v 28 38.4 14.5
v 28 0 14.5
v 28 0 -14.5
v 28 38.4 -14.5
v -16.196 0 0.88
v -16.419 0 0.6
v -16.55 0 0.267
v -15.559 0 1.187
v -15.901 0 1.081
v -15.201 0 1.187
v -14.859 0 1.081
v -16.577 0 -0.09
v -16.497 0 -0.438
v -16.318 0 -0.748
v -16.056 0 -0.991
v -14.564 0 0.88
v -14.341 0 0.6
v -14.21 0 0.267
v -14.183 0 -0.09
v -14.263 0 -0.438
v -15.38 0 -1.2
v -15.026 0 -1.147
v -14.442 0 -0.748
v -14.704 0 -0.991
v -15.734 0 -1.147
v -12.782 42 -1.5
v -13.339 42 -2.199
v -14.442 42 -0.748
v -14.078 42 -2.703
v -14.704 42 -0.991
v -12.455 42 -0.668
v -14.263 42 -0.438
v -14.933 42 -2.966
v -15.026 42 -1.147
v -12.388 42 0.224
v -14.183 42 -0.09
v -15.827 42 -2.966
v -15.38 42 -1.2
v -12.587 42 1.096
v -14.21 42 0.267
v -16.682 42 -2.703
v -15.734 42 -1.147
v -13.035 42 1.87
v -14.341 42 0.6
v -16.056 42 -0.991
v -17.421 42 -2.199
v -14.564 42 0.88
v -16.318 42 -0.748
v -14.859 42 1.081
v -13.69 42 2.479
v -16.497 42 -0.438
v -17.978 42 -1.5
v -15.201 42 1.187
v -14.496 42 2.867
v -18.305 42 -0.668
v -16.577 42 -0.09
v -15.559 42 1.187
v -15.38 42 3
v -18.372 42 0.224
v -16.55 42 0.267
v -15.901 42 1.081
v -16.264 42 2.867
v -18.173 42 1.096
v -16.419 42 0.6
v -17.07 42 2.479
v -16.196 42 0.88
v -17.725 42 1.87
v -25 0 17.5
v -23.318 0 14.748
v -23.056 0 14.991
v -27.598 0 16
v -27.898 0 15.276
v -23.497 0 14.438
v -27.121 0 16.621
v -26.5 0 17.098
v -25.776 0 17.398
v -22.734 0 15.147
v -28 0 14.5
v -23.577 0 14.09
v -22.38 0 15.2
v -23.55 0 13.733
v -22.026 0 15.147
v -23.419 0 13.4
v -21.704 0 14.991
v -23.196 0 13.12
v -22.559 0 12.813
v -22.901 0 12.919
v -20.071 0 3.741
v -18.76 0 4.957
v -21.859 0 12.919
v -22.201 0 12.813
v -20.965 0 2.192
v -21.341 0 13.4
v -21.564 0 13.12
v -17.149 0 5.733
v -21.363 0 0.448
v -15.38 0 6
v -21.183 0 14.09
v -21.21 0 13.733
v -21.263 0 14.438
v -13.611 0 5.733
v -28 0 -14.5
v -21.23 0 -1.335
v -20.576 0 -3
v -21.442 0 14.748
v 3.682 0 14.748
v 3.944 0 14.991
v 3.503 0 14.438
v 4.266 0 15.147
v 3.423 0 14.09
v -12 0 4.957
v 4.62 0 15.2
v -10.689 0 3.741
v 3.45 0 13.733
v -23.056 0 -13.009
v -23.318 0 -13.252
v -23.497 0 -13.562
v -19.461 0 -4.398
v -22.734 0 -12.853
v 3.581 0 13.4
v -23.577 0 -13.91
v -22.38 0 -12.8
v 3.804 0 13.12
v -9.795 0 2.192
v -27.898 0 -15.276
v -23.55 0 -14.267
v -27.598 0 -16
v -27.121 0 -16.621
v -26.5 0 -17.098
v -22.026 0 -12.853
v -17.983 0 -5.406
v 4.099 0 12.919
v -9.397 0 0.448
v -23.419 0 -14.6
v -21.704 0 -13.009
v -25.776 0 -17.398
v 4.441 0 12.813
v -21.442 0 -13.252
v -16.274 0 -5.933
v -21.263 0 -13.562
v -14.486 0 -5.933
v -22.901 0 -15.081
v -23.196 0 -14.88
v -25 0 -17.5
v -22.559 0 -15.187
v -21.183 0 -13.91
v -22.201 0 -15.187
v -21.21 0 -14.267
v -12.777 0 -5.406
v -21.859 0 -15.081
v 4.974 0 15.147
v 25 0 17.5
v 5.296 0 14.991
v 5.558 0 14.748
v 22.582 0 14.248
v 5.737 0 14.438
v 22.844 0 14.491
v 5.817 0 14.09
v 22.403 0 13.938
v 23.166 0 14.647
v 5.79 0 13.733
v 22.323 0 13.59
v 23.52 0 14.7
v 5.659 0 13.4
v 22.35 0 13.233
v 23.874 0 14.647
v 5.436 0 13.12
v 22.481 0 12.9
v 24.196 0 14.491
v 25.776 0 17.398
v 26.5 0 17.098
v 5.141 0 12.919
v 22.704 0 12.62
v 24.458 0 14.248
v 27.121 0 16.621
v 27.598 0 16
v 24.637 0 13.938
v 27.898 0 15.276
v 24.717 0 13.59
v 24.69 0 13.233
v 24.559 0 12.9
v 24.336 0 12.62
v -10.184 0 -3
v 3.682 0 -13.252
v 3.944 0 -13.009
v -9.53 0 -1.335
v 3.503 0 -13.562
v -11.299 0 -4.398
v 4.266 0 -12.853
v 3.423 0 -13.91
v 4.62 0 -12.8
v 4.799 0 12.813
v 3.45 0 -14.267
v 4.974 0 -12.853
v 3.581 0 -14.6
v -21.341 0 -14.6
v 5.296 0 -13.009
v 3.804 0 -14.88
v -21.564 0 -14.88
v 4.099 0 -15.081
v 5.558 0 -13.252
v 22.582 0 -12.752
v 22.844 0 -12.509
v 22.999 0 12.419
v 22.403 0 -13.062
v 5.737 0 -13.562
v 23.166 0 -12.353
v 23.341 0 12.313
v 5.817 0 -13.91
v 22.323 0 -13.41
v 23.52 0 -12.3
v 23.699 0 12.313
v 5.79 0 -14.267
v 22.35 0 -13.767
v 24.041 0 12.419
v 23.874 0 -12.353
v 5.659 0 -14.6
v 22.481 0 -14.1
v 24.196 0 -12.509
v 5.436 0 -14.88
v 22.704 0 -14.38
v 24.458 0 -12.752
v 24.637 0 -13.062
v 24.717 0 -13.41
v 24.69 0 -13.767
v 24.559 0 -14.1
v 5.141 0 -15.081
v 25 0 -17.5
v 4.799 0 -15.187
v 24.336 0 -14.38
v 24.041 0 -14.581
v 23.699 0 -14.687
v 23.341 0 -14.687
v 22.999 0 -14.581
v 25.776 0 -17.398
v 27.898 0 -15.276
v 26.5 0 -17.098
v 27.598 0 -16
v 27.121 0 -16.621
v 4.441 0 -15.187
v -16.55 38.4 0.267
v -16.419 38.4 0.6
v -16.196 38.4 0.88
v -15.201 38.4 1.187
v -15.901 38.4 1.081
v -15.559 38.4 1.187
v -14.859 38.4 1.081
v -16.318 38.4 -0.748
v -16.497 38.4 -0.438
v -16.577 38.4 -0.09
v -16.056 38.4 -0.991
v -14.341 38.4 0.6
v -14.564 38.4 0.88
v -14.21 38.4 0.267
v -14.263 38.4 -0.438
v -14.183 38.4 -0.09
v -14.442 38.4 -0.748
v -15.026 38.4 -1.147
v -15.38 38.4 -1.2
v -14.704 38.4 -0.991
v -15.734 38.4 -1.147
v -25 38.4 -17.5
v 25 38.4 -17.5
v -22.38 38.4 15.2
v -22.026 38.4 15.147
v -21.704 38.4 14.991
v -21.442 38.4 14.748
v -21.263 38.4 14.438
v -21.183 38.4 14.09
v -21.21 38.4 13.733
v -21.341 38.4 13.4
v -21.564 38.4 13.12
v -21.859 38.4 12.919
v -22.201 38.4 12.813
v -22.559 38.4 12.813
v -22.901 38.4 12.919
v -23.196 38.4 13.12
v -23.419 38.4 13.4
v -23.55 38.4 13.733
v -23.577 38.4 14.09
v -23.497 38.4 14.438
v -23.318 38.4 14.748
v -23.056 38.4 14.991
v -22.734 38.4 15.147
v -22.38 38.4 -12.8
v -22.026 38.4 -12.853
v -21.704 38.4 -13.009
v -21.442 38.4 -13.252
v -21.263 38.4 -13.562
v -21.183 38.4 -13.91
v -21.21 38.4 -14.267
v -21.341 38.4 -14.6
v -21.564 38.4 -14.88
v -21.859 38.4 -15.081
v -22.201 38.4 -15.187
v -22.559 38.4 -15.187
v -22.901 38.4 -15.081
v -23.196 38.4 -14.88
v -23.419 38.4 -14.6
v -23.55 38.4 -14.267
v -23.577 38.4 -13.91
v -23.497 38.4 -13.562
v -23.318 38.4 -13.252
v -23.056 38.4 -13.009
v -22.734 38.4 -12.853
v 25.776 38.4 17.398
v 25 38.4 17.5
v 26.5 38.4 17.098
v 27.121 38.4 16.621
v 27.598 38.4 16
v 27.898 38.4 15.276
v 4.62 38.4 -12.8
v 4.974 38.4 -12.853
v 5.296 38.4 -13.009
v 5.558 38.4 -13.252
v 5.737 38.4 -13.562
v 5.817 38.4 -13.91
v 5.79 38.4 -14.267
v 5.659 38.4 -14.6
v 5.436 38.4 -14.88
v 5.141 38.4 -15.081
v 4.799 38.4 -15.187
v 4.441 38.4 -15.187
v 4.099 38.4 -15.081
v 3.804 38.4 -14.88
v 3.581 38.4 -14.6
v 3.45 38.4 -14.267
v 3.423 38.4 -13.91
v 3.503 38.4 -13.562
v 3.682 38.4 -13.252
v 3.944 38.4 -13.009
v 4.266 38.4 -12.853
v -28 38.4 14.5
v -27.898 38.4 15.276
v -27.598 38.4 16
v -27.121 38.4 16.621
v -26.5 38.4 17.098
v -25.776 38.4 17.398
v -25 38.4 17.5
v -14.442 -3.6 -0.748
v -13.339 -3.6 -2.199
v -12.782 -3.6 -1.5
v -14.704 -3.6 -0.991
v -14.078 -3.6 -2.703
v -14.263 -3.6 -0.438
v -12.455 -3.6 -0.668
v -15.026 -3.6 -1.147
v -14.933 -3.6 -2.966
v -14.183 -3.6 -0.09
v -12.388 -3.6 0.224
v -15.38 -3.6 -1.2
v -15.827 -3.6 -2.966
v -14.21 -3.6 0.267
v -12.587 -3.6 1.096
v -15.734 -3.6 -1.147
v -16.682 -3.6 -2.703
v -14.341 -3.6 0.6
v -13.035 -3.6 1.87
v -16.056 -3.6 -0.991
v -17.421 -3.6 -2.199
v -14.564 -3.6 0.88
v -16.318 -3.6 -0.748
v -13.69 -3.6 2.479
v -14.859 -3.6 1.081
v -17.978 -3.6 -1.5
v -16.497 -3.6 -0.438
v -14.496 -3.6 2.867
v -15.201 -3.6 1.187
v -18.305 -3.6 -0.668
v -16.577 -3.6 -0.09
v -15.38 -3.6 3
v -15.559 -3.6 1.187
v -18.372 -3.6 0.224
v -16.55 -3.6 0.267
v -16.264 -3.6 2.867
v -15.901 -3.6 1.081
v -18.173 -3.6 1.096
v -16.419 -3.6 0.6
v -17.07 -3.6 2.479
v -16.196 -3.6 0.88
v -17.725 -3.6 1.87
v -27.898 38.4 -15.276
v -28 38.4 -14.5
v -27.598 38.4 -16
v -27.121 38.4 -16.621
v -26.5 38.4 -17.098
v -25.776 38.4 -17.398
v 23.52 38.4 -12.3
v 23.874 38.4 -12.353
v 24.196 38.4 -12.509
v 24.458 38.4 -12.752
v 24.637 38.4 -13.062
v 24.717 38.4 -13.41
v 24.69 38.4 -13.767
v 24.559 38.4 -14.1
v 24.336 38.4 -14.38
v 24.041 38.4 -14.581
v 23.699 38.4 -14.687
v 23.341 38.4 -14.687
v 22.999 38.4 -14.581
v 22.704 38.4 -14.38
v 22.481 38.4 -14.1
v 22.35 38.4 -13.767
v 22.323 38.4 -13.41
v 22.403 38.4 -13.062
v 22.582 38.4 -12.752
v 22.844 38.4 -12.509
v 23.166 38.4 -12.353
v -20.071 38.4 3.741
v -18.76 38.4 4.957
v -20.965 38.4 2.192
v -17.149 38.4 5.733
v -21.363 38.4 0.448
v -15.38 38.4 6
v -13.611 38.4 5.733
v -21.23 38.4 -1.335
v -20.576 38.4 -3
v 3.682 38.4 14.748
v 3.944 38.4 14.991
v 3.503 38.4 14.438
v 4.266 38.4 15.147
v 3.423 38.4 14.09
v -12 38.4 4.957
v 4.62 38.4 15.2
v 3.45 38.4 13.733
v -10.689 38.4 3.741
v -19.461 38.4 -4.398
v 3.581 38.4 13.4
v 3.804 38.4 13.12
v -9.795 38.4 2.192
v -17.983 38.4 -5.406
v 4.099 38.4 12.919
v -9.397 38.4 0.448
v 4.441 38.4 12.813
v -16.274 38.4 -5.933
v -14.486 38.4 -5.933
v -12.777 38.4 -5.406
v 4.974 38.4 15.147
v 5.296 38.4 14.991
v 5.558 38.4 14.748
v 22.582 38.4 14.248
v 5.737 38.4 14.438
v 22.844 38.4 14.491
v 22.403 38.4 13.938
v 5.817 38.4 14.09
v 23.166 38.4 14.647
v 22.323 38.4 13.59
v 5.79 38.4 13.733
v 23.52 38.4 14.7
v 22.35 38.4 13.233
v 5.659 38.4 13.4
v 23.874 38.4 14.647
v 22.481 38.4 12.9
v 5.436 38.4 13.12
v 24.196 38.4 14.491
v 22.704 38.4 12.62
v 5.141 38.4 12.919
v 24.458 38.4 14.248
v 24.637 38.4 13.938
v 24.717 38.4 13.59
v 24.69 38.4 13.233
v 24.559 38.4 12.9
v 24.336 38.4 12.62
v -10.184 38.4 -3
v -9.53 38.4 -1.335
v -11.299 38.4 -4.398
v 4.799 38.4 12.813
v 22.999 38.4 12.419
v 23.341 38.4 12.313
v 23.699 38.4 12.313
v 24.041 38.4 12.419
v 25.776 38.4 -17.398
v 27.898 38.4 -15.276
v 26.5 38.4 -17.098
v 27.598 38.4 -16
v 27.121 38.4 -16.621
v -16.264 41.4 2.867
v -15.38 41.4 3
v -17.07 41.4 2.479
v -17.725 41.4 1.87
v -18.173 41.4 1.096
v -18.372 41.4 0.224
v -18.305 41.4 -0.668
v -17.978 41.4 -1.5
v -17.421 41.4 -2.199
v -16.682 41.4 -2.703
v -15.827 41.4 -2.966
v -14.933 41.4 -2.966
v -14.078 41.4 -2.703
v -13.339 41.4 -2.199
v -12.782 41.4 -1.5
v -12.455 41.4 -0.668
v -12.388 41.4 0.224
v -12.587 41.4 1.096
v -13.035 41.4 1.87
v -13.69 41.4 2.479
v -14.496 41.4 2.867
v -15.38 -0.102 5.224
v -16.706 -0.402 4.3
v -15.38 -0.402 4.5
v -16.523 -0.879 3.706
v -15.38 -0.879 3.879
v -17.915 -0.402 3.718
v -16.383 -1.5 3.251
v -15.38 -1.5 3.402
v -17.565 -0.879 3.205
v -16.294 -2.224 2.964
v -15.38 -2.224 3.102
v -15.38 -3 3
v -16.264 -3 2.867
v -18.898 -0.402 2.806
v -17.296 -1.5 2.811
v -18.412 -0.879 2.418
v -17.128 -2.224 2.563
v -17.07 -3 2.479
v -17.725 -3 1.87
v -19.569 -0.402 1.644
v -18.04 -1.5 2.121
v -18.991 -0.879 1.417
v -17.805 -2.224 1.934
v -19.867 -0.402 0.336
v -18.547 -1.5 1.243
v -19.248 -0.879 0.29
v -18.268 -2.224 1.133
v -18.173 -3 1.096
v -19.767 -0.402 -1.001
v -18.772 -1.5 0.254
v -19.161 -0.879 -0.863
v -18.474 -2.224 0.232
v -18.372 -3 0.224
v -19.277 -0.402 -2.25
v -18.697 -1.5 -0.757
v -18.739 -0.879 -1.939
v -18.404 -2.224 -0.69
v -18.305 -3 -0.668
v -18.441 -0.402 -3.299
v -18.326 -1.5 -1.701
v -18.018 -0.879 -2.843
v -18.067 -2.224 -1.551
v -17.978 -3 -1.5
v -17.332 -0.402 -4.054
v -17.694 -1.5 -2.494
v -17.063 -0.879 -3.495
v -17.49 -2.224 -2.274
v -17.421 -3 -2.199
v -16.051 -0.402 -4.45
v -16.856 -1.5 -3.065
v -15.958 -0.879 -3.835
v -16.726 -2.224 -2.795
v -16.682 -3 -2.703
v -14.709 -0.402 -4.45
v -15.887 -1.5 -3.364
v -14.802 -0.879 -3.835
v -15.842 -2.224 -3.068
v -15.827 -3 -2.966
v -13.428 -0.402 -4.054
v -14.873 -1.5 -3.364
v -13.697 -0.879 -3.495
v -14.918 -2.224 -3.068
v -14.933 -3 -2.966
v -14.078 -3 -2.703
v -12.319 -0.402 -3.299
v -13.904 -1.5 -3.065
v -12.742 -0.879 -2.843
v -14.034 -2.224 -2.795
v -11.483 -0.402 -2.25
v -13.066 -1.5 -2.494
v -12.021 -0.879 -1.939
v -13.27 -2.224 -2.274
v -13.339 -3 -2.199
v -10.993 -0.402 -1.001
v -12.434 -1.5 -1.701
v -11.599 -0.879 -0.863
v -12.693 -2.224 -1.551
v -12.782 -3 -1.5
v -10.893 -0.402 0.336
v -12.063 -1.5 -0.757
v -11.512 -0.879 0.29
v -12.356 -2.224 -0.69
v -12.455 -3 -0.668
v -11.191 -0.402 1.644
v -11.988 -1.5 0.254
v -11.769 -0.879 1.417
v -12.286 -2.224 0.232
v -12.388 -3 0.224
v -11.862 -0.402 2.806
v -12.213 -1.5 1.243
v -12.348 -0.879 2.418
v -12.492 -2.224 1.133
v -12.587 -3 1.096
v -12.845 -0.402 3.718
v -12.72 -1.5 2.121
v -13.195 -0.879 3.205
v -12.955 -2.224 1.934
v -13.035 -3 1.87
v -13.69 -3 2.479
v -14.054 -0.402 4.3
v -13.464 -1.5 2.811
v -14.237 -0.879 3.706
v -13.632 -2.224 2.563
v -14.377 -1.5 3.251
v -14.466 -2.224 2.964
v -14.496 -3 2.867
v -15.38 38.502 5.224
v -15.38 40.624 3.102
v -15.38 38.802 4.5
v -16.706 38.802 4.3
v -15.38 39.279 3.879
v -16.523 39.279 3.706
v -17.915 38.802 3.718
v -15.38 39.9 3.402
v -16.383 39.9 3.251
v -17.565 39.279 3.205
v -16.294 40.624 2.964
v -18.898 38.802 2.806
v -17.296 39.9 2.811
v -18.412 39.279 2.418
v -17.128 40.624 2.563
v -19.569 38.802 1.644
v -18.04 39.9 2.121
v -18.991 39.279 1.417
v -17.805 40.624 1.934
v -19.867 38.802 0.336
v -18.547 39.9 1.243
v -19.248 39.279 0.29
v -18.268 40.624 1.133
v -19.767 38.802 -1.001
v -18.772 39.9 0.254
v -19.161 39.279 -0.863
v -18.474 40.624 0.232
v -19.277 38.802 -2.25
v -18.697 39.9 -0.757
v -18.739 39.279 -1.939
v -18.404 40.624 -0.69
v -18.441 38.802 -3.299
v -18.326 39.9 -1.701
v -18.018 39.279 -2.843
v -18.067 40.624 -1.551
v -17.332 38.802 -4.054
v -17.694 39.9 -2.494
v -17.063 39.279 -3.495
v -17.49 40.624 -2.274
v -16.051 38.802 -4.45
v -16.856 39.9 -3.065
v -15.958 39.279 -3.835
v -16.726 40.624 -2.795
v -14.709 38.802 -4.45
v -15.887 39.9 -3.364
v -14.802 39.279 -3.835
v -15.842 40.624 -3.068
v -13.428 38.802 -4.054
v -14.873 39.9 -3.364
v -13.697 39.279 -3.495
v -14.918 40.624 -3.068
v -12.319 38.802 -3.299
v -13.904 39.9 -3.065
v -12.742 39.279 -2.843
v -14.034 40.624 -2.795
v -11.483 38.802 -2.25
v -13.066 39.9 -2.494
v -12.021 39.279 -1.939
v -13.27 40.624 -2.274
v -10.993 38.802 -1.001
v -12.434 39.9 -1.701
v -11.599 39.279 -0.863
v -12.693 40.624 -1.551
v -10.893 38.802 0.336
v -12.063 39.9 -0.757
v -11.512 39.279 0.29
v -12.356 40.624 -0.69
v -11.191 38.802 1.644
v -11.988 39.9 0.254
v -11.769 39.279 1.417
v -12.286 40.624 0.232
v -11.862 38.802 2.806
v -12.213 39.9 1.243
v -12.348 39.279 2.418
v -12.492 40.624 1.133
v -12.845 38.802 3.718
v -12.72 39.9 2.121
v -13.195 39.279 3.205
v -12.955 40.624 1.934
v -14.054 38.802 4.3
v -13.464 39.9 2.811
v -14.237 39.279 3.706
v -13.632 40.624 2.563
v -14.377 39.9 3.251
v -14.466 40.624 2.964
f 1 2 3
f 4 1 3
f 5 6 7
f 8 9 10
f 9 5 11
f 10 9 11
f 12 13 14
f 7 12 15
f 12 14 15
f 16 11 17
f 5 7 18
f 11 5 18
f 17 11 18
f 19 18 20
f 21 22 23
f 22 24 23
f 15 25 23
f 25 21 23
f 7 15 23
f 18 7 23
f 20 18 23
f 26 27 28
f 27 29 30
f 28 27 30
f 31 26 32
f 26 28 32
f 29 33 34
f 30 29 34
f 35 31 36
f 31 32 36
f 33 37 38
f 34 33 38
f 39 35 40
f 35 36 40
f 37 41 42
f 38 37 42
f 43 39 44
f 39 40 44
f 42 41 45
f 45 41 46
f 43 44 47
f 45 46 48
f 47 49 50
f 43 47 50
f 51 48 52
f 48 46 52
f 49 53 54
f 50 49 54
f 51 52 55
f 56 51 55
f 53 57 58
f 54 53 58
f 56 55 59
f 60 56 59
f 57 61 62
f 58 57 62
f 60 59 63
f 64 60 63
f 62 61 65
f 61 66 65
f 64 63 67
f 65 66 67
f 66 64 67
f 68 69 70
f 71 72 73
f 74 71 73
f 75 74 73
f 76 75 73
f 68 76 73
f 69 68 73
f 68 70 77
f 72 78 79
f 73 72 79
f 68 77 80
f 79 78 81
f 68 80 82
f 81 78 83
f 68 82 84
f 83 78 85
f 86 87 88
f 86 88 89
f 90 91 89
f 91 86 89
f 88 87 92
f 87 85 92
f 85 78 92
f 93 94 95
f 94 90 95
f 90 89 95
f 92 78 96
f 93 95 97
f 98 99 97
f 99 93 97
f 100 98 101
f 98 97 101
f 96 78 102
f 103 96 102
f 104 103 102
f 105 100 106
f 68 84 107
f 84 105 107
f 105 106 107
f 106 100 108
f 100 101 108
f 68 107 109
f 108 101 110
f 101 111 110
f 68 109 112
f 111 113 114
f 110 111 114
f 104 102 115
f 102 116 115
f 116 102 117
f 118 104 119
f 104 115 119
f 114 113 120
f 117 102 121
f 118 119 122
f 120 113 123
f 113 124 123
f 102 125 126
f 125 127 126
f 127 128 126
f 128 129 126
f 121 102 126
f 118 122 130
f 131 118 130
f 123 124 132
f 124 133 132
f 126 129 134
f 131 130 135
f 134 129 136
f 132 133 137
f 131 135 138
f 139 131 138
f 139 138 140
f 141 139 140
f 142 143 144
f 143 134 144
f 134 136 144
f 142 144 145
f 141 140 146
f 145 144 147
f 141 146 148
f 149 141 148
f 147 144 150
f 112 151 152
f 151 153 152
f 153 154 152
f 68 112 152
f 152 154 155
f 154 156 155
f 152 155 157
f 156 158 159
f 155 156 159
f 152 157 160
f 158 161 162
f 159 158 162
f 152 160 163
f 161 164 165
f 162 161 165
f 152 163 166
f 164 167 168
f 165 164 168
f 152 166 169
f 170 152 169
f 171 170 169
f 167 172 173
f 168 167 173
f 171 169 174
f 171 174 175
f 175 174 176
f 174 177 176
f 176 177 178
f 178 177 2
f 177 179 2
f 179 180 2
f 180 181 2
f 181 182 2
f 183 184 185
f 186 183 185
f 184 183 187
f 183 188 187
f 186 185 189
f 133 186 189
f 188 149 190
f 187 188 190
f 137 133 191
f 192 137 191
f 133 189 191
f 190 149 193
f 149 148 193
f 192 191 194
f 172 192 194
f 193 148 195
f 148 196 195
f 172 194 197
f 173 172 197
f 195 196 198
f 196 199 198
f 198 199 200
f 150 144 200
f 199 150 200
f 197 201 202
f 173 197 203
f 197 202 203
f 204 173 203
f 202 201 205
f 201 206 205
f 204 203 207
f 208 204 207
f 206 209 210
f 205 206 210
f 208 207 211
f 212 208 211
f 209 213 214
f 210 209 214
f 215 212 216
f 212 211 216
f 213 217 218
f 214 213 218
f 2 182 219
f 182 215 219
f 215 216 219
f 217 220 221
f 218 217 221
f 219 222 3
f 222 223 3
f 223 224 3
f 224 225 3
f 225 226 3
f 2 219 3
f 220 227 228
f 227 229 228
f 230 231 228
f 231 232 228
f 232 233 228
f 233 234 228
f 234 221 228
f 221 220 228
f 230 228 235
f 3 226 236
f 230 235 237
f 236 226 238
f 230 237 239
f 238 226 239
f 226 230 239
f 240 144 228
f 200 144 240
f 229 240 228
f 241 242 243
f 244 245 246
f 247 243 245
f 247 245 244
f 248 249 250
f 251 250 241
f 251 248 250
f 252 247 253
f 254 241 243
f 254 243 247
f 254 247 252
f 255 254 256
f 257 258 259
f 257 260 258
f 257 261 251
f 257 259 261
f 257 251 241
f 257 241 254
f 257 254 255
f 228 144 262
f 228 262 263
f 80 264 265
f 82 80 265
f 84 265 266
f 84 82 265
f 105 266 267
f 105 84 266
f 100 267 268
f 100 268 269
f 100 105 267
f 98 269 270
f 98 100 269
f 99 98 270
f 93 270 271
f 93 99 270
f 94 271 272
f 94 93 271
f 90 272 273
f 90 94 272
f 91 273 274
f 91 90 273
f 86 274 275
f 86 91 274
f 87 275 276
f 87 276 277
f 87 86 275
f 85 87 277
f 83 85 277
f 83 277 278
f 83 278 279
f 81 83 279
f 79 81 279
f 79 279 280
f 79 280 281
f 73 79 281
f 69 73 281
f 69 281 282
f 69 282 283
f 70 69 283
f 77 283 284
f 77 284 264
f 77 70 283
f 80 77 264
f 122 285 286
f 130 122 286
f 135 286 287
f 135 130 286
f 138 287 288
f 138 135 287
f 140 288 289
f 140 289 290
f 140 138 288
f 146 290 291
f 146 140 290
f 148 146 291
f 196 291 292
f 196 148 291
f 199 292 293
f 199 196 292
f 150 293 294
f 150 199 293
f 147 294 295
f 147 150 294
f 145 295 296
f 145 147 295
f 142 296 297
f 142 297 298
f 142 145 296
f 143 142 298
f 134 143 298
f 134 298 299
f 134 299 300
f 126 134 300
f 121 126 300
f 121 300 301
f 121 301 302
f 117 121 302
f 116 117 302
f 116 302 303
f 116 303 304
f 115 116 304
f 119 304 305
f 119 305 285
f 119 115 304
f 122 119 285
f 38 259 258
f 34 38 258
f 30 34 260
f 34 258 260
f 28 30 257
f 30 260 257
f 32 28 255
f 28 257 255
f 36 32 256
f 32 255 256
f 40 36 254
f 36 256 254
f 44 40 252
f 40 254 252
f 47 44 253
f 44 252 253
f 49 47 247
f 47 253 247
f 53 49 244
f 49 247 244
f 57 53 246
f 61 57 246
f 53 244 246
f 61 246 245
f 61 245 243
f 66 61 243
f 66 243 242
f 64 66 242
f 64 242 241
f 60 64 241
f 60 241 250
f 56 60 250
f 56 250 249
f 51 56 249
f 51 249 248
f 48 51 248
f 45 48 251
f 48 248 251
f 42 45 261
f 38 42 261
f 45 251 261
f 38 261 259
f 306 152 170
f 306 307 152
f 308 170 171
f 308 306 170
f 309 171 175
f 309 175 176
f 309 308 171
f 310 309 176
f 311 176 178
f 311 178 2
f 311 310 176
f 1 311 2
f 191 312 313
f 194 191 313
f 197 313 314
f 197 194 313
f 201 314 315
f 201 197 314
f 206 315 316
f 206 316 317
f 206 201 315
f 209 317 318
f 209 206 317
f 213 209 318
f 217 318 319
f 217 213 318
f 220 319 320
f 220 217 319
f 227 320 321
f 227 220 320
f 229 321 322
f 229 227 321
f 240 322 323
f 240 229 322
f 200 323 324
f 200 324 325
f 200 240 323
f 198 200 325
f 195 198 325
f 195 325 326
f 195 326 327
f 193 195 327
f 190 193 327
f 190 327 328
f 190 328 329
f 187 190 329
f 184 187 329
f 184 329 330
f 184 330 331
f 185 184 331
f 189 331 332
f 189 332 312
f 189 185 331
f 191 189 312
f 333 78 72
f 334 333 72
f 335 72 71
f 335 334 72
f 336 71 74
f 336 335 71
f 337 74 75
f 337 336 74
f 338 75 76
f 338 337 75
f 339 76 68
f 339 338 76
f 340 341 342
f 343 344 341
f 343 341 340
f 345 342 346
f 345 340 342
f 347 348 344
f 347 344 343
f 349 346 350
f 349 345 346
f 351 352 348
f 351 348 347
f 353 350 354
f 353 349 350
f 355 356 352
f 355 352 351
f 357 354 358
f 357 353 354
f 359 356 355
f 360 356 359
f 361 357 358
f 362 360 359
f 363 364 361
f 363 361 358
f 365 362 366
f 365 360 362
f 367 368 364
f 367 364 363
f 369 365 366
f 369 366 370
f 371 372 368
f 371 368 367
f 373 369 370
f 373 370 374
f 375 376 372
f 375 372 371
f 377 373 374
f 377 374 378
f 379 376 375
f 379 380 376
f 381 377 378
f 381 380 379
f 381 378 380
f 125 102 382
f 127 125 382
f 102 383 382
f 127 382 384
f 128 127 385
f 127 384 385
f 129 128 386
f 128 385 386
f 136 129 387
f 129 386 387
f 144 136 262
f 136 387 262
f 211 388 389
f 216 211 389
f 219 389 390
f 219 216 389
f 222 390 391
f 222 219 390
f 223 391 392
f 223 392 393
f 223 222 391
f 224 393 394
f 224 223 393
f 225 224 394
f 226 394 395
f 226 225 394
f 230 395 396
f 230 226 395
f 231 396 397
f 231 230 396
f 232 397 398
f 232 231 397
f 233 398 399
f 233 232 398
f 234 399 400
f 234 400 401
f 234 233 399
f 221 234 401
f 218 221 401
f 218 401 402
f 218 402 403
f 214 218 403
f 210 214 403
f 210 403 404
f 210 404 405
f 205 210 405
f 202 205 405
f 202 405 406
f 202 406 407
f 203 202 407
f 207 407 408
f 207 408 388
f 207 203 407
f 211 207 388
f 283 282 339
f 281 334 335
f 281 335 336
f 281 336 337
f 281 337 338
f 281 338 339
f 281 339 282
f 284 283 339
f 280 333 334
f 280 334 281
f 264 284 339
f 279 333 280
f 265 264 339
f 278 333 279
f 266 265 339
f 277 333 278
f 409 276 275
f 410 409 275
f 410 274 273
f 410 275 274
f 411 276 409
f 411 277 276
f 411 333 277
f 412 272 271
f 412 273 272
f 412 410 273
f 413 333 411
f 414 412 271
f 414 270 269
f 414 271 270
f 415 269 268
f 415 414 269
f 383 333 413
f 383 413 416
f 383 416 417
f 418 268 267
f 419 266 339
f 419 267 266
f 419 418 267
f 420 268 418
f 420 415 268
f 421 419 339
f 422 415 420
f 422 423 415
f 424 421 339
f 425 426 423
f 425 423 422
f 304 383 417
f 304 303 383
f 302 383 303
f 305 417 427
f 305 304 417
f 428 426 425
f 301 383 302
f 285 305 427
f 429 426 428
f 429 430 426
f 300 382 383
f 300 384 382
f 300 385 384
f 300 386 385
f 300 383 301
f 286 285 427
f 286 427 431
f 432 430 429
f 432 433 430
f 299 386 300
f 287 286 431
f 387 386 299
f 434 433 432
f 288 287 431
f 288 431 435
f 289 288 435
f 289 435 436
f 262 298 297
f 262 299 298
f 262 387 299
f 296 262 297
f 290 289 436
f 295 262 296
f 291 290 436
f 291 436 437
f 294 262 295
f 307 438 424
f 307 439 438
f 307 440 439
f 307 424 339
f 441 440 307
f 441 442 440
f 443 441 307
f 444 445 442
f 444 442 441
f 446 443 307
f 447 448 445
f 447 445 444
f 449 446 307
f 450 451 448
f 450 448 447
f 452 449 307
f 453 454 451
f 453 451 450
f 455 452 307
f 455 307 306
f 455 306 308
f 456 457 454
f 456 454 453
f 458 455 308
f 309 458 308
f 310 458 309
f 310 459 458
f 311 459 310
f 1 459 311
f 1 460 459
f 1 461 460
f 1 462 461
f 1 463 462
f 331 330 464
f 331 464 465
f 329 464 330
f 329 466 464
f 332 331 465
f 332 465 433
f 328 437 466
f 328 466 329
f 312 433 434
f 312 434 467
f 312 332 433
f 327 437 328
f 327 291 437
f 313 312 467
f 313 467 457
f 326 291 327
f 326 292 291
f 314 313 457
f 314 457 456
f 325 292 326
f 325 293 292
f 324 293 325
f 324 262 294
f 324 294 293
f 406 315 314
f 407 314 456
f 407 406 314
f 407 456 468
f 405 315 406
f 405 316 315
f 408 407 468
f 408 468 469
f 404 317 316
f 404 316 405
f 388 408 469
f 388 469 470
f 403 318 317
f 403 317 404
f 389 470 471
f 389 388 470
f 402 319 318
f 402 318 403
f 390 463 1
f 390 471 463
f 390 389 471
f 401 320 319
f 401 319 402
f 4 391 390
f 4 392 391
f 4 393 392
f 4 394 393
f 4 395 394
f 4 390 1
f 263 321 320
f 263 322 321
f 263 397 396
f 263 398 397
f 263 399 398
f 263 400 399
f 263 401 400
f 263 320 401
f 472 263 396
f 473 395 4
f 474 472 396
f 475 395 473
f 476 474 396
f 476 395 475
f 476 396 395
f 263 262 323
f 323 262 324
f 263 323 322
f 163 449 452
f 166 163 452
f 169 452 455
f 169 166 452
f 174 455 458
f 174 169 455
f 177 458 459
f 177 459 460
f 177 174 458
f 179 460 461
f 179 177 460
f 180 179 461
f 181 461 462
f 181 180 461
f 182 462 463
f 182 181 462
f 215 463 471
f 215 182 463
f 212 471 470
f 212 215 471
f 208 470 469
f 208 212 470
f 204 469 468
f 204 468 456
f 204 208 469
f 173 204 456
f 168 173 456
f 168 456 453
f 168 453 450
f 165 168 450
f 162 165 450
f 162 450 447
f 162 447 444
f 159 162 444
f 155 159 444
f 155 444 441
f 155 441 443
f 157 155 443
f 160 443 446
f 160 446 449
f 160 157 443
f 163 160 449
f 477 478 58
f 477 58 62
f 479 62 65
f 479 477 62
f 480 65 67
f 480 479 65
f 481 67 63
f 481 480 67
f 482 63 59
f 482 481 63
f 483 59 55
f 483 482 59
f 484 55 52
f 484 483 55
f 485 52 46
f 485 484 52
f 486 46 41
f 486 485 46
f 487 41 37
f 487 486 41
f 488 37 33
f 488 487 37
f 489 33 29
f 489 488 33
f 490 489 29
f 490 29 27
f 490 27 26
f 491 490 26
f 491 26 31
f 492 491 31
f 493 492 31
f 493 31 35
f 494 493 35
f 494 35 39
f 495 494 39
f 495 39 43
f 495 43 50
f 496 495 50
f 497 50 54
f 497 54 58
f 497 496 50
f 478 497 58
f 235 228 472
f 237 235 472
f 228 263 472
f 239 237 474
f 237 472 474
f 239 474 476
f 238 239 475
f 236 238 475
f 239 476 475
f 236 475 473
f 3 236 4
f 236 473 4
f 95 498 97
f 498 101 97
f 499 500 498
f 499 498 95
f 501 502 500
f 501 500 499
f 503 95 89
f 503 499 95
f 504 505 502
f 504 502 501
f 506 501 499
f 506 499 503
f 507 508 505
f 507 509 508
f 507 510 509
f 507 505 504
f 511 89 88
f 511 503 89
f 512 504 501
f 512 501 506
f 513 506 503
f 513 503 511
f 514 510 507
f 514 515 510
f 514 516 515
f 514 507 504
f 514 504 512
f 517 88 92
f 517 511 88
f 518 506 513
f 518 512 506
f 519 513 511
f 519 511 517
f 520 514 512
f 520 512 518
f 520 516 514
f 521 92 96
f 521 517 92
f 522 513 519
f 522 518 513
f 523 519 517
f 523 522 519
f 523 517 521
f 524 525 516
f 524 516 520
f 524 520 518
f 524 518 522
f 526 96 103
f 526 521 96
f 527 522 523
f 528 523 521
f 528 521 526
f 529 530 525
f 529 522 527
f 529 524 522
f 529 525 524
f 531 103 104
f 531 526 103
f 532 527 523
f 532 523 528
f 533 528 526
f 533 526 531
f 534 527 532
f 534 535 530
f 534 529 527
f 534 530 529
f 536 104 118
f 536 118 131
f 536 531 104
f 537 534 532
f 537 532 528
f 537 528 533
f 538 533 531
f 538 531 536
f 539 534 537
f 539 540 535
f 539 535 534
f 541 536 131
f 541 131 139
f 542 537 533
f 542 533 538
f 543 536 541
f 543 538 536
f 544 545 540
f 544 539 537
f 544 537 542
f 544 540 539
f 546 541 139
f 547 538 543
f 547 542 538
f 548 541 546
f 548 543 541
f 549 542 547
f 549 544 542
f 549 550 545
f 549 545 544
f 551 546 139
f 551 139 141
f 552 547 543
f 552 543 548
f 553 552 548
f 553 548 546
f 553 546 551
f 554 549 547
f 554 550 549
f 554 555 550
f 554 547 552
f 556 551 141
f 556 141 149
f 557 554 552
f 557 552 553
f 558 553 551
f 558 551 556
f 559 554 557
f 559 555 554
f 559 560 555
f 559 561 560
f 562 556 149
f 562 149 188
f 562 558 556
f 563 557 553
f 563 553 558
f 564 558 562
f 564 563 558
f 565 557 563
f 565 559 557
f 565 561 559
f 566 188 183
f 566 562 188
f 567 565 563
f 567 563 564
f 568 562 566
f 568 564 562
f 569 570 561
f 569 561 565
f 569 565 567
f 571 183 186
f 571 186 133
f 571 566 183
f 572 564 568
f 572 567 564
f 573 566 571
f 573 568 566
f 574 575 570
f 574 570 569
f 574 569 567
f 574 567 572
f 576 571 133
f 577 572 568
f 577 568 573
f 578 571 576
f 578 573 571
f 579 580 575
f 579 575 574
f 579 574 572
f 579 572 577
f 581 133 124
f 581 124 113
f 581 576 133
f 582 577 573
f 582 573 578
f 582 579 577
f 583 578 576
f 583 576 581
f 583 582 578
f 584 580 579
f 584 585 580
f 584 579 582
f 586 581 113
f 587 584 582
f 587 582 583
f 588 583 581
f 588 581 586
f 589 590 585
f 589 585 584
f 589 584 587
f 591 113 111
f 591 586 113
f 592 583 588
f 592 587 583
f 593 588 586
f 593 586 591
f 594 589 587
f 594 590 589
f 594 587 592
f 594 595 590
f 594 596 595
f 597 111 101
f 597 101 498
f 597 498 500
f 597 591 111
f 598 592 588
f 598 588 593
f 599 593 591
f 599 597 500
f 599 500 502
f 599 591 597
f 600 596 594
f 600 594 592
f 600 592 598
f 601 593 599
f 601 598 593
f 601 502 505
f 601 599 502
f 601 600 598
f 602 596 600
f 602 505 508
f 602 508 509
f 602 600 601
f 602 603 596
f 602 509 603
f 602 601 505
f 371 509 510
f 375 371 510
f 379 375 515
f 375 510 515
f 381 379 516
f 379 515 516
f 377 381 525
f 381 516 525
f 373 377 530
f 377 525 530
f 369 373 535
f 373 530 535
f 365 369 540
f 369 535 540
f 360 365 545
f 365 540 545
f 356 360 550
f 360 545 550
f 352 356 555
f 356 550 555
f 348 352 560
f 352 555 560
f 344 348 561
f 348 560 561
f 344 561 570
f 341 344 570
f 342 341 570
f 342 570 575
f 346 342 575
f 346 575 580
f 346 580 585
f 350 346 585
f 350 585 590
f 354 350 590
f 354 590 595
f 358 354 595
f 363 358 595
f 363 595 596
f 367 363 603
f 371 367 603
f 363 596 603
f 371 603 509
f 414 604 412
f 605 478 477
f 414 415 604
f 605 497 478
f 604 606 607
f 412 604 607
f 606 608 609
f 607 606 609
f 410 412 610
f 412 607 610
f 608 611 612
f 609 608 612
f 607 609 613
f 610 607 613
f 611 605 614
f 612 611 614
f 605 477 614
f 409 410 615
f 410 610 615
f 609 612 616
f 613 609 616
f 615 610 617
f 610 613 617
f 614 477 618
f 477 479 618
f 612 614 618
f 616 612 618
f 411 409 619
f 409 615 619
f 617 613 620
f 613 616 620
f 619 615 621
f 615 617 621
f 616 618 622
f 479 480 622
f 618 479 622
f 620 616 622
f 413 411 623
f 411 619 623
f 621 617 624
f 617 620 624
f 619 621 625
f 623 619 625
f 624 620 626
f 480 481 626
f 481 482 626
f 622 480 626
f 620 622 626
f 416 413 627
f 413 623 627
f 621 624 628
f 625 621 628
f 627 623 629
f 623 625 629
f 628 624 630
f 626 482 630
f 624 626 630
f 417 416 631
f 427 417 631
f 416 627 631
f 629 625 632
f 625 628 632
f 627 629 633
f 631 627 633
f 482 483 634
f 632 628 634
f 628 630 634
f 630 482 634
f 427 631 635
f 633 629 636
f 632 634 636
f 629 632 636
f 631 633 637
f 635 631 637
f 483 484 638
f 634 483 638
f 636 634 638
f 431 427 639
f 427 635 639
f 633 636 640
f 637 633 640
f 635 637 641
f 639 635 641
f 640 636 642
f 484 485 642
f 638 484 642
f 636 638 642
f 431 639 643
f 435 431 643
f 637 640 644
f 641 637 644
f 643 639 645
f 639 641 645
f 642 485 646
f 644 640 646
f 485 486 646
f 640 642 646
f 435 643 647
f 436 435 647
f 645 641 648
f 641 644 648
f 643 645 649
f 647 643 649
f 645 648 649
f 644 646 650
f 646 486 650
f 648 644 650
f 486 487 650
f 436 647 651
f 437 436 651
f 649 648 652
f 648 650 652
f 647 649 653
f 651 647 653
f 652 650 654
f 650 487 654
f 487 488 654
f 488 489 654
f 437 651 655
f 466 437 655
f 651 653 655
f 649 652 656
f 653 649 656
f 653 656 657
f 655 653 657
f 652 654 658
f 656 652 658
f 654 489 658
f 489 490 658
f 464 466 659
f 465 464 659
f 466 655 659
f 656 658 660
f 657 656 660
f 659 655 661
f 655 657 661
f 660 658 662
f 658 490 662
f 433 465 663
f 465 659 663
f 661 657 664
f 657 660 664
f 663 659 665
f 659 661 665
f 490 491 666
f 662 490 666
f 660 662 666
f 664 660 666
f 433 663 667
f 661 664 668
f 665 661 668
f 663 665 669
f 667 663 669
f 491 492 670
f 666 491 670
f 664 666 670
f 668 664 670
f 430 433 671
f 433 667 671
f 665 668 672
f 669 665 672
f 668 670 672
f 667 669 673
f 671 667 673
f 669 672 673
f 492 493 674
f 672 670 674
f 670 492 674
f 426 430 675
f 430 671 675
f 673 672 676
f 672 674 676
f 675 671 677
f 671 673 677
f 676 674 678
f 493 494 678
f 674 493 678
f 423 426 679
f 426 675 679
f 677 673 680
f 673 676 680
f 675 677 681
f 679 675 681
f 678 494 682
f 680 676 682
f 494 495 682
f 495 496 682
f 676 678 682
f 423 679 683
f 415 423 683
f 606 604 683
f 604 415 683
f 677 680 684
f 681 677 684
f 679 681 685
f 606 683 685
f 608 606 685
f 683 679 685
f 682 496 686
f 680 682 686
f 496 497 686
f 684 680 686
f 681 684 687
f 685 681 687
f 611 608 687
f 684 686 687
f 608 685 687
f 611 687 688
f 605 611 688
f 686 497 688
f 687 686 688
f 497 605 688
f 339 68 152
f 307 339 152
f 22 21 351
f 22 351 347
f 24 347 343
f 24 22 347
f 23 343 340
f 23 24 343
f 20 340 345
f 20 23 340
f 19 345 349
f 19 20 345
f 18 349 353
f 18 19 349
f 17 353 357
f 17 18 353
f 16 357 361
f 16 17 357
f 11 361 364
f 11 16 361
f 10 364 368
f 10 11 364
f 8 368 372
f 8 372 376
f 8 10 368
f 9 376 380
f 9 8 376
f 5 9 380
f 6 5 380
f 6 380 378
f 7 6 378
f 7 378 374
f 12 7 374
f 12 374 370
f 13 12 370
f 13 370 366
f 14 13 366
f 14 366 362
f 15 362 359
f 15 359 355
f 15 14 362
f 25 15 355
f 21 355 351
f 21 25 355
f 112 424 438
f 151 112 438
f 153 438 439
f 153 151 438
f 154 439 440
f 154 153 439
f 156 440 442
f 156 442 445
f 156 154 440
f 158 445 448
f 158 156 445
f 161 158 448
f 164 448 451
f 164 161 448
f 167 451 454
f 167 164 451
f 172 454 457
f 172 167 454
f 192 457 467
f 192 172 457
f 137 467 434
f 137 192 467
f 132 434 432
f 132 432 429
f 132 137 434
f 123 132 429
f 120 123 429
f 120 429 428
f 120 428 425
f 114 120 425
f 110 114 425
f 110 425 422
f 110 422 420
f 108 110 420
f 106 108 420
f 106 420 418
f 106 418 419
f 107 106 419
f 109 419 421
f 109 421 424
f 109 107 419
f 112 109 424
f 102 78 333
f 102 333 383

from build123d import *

# Parameters (mm, degrees)
SKETCH1_W           = 56
SKETCH1_H           = 35
SKETCH1_R           = 1.2
BOSS_EXTRUDE1_DEPTH = 38.4
SKETCH2_R           = 3
SKETCH2_R_2         = 1.2
BOSS_EXTRUDE2_DEPTH = 3.6
FILLET2_R           = 3


with BuildPart() as part:
    # Sketch1 → Boss-Extrude1 (new body)
    with BuildSketch(Plane(origin=(0, 0, 0), x_dir=(1, 0, 0), z_dir=(0, 1, 0))):
        Rectangle(SKETCH1_W, SKETCH1_H)
        with Locations(Location((-22.38, 14, 0), (0, 0, 270))):
            Circle(SKETCH1_R, mode=Mode.SUBTRACT)
        with Locations(Location((4.62, 14, 0), (0, 0, 270))):
            Circle(SKETCH1_R, mode=Mode.SUBTRACT)
        with Locations(Location((-22.38, -14, 0), (0, 0, 270))):
            Circle(SKETCH1_R, mode=Mode.SUBTRACT)
        with Locations(Location((4.62, -14, 0), (0, 0, 270))):
            Circle(SKETCH1_R, mode=Mode.SUBTRACT)
        with Locations(Location((23.52, 13.5, 0), (0, 0, 270))):
            Circle(SKETCH1_R, mode=Mode.SUBTRACT)
        with Locations(Location((23.52, -13.5, 0), (0, 0, 270))):
            Circle(SKETCH1_R, mode=Mode.SUBTRACT)
    extrude(amount=BOSS_EXTRUDE1_DEPTH)

    # Sketch2 → Boss-Extrude2 (add)
    with BuildSketch(Plane.XZ):
        with Locations(Location((-15.38, 0, 0), (0, 0, 90))):
            Circle(SKETCH2_R)
        with Locations(Location((-15.38, 0, 0), (0, 0, 270))):
            Circle(SKETCH2_R_2, mode=Mode.SUBTRACT)
    boss_extrude2 = extrude(amount=BOSS_EXTRUDE2_DEPTH)

    # Mirror2: Boss-Extrude2 across plane
    add(boss_extrude2.mirror(Plane(origin=(0, 19.2, 0), x_dir=(0, 0, 1), z_dir=(0, -1, 0))))

    # Fillet2
    fillet2_edges = [part.edges().sort_by_distance(p)[0] for p in [
        (-15.38, 0, -3),
        (-15.38, 38.4, -3),
        (-28, 19.2, -17.5),
        (28, 19.2, -17.5),
        (28, 19.2, 17.5),
        (-28, 19.2, 17.5),
    ]]
    fillet(fillet2_edges, radius=FILLET2_R)


solid = part.part
